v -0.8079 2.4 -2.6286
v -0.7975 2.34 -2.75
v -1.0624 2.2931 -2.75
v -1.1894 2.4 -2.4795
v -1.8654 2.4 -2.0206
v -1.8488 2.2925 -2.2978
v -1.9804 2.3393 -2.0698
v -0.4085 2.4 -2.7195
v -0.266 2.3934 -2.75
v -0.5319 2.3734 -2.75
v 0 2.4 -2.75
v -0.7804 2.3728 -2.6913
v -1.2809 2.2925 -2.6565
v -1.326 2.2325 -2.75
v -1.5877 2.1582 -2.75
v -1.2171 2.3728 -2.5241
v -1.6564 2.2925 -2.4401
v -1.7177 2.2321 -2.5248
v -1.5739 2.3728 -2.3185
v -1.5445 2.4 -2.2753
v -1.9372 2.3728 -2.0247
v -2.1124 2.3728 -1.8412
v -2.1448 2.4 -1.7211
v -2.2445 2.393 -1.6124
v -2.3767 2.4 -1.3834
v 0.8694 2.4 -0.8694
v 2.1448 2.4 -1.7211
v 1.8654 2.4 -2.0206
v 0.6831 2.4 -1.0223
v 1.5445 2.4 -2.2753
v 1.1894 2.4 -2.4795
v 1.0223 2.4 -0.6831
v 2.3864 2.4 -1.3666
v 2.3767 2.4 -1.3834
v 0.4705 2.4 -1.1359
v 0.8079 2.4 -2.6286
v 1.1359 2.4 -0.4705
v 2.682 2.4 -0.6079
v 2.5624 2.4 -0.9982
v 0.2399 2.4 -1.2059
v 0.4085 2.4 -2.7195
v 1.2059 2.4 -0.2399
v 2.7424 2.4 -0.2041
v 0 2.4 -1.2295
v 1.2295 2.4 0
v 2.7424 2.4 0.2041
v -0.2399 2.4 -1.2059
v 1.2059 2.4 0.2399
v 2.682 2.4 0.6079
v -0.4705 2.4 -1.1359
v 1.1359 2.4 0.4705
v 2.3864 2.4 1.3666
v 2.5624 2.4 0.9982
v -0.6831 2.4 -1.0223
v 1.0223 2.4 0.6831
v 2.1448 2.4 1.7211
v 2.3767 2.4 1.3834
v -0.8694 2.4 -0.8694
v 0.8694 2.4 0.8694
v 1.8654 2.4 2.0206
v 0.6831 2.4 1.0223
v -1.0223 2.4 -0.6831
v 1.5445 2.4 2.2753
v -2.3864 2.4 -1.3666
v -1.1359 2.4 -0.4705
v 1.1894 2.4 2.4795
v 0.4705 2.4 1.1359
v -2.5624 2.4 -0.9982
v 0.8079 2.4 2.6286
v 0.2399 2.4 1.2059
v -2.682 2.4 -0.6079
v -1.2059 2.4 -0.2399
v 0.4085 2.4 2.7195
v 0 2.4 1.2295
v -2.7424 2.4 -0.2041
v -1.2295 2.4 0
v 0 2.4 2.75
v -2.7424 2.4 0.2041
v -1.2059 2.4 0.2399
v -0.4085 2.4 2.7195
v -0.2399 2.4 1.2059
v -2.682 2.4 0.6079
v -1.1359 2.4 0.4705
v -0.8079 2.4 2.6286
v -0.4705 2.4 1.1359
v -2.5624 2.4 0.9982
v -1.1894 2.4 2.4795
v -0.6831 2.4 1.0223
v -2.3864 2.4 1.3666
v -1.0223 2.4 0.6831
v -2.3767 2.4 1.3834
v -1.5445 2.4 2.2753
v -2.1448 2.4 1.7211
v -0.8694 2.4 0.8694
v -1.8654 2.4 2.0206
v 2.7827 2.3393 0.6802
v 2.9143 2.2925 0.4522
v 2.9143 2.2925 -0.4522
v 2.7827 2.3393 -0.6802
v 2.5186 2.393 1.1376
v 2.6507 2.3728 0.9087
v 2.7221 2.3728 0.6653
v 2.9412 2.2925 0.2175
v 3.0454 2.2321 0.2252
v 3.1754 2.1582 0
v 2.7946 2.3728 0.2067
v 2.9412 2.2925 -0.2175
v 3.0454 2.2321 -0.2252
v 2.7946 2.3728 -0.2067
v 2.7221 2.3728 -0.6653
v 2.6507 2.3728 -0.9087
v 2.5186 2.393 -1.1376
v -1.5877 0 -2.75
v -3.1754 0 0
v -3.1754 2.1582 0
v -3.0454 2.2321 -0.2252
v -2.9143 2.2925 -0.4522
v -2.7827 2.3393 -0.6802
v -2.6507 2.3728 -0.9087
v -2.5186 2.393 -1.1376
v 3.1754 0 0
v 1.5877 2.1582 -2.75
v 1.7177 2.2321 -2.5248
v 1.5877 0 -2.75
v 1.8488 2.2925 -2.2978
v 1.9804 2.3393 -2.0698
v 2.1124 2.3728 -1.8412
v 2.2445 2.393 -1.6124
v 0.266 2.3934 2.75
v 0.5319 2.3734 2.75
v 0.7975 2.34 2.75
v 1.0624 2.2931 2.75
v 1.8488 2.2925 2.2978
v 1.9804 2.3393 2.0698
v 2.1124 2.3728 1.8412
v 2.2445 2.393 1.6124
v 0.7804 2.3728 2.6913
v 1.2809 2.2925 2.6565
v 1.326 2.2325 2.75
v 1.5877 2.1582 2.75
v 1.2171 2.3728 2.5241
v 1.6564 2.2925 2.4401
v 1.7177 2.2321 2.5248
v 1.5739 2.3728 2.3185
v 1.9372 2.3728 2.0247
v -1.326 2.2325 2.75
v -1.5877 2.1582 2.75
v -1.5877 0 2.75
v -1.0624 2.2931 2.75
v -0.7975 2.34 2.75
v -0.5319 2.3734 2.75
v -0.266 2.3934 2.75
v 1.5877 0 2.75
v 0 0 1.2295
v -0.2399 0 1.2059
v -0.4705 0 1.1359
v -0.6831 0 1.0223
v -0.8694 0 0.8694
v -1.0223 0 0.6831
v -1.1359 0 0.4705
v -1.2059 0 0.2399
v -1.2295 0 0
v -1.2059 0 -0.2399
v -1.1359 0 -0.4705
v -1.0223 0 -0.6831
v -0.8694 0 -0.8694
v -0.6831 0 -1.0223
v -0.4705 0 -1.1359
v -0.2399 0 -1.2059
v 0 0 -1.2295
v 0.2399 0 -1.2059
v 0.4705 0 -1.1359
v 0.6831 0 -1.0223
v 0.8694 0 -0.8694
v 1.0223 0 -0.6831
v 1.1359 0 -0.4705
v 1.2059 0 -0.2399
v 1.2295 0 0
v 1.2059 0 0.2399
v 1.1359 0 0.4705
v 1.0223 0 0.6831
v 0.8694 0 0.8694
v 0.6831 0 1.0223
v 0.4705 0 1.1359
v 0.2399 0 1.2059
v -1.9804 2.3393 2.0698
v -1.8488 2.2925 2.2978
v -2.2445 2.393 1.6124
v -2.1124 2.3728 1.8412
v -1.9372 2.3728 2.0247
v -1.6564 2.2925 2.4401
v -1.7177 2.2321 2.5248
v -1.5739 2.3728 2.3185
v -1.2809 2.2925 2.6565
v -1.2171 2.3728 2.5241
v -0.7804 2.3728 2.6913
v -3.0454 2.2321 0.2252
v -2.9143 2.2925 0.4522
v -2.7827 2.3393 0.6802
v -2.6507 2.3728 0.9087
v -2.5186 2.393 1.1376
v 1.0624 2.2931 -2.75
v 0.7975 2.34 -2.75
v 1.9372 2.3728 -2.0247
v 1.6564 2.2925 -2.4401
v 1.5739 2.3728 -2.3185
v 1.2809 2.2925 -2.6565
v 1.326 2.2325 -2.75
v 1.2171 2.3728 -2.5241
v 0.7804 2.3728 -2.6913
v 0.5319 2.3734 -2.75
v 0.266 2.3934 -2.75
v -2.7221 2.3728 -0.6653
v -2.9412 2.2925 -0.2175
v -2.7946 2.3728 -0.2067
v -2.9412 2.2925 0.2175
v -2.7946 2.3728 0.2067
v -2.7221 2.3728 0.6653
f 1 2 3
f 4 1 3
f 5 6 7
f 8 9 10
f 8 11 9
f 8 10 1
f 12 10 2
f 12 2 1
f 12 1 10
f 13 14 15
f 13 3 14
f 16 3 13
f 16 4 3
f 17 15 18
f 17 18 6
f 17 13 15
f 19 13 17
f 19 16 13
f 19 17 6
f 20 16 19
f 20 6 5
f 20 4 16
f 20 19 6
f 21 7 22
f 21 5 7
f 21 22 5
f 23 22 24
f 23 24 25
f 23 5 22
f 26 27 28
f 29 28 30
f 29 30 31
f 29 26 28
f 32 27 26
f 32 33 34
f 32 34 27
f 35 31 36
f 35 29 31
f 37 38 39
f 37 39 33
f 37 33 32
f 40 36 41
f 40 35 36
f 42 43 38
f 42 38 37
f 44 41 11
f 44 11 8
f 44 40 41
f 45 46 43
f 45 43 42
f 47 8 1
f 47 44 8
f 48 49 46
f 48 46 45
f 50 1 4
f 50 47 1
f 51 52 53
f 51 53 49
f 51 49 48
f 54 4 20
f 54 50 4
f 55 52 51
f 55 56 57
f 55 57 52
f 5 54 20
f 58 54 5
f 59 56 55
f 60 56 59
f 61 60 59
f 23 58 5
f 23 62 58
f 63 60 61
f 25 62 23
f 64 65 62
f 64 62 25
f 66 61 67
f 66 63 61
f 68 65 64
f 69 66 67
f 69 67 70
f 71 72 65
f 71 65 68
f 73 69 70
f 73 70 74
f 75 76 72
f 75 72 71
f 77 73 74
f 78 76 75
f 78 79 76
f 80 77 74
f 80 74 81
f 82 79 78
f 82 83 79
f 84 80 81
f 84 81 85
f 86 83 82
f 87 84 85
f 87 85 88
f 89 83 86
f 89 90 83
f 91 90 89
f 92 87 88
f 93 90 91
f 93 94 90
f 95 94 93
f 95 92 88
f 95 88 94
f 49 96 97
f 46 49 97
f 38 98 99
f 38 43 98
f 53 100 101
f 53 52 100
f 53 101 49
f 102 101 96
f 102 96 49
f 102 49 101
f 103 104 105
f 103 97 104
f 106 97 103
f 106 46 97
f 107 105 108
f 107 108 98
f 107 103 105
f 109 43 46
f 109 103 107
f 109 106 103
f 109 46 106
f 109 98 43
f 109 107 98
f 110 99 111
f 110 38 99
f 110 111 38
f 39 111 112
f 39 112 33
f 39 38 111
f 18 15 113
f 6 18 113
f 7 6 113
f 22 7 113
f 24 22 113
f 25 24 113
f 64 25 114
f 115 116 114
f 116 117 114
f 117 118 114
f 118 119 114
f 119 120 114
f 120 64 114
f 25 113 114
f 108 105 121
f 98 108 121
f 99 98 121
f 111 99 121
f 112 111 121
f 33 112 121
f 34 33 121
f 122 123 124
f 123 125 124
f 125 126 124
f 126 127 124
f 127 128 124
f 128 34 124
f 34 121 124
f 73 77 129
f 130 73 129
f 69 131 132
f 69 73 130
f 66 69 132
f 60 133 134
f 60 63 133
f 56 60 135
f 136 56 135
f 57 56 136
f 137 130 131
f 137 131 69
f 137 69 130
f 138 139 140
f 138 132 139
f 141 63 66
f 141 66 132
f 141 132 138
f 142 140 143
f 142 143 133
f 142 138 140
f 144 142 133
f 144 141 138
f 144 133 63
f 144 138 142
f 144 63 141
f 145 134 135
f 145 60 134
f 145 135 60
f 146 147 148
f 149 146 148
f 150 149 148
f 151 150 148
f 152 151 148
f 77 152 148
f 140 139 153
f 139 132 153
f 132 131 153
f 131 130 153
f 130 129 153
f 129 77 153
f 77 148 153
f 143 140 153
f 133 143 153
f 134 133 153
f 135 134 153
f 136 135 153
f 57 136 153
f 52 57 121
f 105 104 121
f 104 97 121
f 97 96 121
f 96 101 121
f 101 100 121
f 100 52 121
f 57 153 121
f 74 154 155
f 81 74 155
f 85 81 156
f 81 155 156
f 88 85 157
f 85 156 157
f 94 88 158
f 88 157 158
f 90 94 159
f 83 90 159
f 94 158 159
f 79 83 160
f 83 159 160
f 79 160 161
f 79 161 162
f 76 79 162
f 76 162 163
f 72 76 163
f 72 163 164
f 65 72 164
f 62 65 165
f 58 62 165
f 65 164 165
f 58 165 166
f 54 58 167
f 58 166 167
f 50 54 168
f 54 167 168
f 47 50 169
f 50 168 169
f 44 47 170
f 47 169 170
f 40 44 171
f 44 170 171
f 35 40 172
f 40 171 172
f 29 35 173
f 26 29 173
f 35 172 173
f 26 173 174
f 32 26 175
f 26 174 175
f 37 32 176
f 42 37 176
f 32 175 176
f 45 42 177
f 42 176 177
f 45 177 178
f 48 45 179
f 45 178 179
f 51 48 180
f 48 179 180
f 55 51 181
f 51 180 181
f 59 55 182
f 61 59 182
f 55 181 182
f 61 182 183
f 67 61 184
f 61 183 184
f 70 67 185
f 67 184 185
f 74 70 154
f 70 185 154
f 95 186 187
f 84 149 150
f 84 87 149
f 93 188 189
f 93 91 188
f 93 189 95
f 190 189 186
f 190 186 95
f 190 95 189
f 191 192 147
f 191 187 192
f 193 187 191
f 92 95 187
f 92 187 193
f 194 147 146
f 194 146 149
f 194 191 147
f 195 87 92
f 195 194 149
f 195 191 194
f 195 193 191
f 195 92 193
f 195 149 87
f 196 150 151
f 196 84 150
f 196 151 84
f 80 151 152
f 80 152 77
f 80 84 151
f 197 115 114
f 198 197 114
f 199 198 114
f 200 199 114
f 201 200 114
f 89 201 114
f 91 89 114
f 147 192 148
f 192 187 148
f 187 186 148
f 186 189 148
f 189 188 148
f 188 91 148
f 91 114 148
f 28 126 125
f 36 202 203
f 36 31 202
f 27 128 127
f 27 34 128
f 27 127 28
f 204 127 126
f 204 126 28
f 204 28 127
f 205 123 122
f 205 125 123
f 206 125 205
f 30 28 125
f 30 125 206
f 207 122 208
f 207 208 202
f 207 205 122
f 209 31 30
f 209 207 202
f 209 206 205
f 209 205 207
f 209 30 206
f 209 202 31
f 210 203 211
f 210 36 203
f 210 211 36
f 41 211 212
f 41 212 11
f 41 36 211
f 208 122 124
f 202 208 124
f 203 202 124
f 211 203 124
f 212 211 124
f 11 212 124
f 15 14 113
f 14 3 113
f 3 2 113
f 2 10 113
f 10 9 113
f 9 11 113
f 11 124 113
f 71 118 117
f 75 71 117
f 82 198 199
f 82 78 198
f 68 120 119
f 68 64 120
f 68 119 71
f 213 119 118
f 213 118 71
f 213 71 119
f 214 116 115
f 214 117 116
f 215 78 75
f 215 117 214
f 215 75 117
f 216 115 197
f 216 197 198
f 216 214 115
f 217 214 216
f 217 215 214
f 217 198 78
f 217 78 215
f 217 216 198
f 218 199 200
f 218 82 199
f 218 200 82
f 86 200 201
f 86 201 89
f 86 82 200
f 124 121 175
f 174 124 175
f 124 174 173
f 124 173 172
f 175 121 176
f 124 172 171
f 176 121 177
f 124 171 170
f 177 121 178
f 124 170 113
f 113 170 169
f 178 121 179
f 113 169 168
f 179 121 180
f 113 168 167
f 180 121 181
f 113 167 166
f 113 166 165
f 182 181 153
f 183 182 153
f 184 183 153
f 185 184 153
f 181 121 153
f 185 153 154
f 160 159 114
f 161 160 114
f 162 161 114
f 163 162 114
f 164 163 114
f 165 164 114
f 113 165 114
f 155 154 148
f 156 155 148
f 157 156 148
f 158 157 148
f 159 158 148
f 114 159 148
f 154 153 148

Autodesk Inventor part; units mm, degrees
ref_plane "YZ Plane" through (0, 0, 0) normal (1, 0, 0) x (0, 1, 0)
ref_plane "XZ Plane" through (0, 0, 0) normal (0, 1, 0) x (-1, 0, 0)
ref_plane "XY Plane" through (0, 0, 0) normal (0, 0, 1) x (1, 0, 0)
sketch "スケッチ1" plane through (0, 0, 0) normal (0, 1, 0) x (-1, 0, 0)
  circle A0 centre (0, 0) radius 3.1754 construction
  line L0 (3.1754, 0) -> (1.5877, 2.75)
  line L1 (1.5877, 2.75) -> (-1.5877, 2.75)
  line L2 (-1.5877, 2.75) -> (-3.1754, 0)
  line L3 (-3.1754, 0) -> (-1.5877, -2.75)
  line L4 (-1.5877, -2.75) -> (1.5877, -2.75)
  line L5 (1.5877, -2.75) -> (3.1754, 0)
  dimension "d0" = 5.5
extrude "押し出し1" add sketch "スケッチ1" along normal blind 2.4
sketch "スケッチ2" plane through (0, 2.4, 0) normal (0, 1, 0) x (1, 0, 0)
  point P0 (0, 0)
  point P1 (0, 0)
hole "穴1" at (0, 2.4, 0) direction (0, -1, 0) diameter 2.459 end through all thread size "M3x0.5" class "6H" standard "ISO Metric profile"
sketch "スケッチ3" plane through (0, 0, 0) normal (1, 0, 0) x (0, 1, 0)
  arc A0 (1.7511, -3.75) -> (2.4, -2.75) centre (-2.9327, 0) ccw
  line L0 (0, -2.75) -> (2.4, -2.75) construction
  line L1 (2.4, -3.75) -> (1.7511, -3.75)
  line L2 (2.4, 1.2295) -> (2.4, -1.2295) construction
  line L3 (2.4, -2.75) -> (2.4, -3.75)
  line L4 (-4.0042, 0) -> (3.4964, 0) projected
  point P0 (0, 0)
  point P1 (2.4, 0)
  dimension "d10" = 2.75
  dimension "d11" = 6
  dimension "d12" = 1
revolve "回転1" cut sketch "スケッチ3" angle 360 about axis through (0, -10, 0) along (0, 1, 0)
properties part number "M3-HexaNut-type2"
